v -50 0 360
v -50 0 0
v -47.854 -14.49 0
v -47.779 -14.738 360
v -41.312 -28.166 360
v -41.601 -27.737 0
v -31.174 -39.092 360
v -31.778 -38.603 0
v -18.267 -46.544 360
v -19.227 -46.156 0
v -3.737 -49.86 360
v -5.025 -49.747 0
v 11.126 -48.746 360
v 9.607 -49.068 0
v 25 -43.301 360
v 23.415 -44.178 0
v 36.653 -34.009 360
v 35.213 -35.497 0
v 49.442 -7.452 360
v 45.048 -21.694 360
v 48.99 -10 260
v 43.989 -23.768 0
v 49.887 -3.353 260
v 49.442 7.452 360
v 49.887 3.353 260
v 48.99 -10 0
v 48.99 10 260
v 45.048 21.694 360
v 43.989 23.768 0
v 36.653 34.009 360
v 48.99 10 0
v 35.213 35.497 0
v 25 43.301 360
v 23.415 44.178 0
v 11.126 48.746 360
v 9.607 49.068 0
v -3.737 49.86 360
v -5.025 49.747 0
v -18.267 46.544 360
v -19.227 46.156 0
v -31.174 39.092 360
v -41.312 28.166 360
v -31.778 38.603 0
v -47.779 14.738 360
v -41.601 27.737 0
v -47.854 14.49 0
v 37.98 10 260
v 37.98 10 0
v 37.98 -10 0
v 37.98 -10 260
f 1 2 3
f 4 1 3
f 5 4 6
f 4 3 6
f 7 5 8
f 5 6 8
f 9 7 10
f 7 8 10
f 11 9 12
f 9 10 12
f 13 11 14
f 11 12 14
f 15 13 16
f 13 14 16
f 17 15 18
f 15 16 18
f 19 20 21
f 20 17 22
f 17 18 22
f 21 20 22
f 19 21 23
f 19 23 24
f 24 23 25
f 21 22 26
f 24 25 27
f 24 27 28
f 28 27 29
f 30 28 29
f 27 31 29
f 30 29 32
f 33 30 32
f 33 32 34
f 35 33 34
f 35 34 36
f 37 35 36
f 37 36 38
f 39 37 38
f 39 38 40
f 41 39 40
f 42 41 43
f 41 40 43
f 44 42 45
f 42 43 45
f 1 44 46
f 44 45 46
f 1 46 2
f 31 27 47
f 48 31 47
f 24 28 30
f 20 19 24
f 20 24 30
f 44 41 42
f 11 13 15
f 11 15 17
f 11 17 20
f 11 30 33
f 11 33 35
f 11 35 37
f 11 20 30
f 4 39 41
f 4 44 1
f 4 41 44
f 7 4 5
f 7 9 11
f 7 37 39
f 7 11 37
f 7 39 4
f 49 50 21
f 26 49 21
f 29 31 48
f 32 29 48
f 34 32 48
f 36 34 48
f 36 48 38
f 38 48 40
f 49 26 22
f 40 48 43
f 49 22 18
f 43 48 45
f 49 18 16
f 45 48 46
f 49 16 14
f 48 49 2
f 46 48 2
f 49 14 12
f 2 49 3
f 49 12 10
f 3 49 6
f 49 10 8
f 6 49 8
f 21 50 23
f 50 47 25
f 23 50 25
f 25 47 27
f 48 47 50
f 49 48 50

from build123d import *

# Parameters (mm, degrees)
SKETCH2_R           = 50
BOSS_EXTRUDE1_DEPTH = 360
CUT_EXTRUDE2_DEPTH  = 260


with BuildPart() as part:
    # Sketch2 → Boss-Extrude1 (new body)
    with BuildSketch(Plane.XY):
        with Locations(Location((0, 0, 0), (0, 0, 180))):
            Circle(SKETCH2_R)
    extrude(amount=BOSS_EXTRUDE1_DEPTH)

    # Sketch3 → Cut-Extrude2 (cut)
    with BuildSketch(Plane.XY):
        with BuildLine():
            Line((48.989794856, 10), (37.979794856, 10))
            Line((37.979794856, 10), (37.979794856, -10))
            Line((37.979794856, -10), (48.989794856, -10))
            ThreePointArc((48.989794856, -10), (50, 0), (48.989794856, 10))
        make_face()
    extrude(amount=CUT_EXTRUDE2_DEPTH, mode=Mode.SUBTRACT)


solid = part.part
